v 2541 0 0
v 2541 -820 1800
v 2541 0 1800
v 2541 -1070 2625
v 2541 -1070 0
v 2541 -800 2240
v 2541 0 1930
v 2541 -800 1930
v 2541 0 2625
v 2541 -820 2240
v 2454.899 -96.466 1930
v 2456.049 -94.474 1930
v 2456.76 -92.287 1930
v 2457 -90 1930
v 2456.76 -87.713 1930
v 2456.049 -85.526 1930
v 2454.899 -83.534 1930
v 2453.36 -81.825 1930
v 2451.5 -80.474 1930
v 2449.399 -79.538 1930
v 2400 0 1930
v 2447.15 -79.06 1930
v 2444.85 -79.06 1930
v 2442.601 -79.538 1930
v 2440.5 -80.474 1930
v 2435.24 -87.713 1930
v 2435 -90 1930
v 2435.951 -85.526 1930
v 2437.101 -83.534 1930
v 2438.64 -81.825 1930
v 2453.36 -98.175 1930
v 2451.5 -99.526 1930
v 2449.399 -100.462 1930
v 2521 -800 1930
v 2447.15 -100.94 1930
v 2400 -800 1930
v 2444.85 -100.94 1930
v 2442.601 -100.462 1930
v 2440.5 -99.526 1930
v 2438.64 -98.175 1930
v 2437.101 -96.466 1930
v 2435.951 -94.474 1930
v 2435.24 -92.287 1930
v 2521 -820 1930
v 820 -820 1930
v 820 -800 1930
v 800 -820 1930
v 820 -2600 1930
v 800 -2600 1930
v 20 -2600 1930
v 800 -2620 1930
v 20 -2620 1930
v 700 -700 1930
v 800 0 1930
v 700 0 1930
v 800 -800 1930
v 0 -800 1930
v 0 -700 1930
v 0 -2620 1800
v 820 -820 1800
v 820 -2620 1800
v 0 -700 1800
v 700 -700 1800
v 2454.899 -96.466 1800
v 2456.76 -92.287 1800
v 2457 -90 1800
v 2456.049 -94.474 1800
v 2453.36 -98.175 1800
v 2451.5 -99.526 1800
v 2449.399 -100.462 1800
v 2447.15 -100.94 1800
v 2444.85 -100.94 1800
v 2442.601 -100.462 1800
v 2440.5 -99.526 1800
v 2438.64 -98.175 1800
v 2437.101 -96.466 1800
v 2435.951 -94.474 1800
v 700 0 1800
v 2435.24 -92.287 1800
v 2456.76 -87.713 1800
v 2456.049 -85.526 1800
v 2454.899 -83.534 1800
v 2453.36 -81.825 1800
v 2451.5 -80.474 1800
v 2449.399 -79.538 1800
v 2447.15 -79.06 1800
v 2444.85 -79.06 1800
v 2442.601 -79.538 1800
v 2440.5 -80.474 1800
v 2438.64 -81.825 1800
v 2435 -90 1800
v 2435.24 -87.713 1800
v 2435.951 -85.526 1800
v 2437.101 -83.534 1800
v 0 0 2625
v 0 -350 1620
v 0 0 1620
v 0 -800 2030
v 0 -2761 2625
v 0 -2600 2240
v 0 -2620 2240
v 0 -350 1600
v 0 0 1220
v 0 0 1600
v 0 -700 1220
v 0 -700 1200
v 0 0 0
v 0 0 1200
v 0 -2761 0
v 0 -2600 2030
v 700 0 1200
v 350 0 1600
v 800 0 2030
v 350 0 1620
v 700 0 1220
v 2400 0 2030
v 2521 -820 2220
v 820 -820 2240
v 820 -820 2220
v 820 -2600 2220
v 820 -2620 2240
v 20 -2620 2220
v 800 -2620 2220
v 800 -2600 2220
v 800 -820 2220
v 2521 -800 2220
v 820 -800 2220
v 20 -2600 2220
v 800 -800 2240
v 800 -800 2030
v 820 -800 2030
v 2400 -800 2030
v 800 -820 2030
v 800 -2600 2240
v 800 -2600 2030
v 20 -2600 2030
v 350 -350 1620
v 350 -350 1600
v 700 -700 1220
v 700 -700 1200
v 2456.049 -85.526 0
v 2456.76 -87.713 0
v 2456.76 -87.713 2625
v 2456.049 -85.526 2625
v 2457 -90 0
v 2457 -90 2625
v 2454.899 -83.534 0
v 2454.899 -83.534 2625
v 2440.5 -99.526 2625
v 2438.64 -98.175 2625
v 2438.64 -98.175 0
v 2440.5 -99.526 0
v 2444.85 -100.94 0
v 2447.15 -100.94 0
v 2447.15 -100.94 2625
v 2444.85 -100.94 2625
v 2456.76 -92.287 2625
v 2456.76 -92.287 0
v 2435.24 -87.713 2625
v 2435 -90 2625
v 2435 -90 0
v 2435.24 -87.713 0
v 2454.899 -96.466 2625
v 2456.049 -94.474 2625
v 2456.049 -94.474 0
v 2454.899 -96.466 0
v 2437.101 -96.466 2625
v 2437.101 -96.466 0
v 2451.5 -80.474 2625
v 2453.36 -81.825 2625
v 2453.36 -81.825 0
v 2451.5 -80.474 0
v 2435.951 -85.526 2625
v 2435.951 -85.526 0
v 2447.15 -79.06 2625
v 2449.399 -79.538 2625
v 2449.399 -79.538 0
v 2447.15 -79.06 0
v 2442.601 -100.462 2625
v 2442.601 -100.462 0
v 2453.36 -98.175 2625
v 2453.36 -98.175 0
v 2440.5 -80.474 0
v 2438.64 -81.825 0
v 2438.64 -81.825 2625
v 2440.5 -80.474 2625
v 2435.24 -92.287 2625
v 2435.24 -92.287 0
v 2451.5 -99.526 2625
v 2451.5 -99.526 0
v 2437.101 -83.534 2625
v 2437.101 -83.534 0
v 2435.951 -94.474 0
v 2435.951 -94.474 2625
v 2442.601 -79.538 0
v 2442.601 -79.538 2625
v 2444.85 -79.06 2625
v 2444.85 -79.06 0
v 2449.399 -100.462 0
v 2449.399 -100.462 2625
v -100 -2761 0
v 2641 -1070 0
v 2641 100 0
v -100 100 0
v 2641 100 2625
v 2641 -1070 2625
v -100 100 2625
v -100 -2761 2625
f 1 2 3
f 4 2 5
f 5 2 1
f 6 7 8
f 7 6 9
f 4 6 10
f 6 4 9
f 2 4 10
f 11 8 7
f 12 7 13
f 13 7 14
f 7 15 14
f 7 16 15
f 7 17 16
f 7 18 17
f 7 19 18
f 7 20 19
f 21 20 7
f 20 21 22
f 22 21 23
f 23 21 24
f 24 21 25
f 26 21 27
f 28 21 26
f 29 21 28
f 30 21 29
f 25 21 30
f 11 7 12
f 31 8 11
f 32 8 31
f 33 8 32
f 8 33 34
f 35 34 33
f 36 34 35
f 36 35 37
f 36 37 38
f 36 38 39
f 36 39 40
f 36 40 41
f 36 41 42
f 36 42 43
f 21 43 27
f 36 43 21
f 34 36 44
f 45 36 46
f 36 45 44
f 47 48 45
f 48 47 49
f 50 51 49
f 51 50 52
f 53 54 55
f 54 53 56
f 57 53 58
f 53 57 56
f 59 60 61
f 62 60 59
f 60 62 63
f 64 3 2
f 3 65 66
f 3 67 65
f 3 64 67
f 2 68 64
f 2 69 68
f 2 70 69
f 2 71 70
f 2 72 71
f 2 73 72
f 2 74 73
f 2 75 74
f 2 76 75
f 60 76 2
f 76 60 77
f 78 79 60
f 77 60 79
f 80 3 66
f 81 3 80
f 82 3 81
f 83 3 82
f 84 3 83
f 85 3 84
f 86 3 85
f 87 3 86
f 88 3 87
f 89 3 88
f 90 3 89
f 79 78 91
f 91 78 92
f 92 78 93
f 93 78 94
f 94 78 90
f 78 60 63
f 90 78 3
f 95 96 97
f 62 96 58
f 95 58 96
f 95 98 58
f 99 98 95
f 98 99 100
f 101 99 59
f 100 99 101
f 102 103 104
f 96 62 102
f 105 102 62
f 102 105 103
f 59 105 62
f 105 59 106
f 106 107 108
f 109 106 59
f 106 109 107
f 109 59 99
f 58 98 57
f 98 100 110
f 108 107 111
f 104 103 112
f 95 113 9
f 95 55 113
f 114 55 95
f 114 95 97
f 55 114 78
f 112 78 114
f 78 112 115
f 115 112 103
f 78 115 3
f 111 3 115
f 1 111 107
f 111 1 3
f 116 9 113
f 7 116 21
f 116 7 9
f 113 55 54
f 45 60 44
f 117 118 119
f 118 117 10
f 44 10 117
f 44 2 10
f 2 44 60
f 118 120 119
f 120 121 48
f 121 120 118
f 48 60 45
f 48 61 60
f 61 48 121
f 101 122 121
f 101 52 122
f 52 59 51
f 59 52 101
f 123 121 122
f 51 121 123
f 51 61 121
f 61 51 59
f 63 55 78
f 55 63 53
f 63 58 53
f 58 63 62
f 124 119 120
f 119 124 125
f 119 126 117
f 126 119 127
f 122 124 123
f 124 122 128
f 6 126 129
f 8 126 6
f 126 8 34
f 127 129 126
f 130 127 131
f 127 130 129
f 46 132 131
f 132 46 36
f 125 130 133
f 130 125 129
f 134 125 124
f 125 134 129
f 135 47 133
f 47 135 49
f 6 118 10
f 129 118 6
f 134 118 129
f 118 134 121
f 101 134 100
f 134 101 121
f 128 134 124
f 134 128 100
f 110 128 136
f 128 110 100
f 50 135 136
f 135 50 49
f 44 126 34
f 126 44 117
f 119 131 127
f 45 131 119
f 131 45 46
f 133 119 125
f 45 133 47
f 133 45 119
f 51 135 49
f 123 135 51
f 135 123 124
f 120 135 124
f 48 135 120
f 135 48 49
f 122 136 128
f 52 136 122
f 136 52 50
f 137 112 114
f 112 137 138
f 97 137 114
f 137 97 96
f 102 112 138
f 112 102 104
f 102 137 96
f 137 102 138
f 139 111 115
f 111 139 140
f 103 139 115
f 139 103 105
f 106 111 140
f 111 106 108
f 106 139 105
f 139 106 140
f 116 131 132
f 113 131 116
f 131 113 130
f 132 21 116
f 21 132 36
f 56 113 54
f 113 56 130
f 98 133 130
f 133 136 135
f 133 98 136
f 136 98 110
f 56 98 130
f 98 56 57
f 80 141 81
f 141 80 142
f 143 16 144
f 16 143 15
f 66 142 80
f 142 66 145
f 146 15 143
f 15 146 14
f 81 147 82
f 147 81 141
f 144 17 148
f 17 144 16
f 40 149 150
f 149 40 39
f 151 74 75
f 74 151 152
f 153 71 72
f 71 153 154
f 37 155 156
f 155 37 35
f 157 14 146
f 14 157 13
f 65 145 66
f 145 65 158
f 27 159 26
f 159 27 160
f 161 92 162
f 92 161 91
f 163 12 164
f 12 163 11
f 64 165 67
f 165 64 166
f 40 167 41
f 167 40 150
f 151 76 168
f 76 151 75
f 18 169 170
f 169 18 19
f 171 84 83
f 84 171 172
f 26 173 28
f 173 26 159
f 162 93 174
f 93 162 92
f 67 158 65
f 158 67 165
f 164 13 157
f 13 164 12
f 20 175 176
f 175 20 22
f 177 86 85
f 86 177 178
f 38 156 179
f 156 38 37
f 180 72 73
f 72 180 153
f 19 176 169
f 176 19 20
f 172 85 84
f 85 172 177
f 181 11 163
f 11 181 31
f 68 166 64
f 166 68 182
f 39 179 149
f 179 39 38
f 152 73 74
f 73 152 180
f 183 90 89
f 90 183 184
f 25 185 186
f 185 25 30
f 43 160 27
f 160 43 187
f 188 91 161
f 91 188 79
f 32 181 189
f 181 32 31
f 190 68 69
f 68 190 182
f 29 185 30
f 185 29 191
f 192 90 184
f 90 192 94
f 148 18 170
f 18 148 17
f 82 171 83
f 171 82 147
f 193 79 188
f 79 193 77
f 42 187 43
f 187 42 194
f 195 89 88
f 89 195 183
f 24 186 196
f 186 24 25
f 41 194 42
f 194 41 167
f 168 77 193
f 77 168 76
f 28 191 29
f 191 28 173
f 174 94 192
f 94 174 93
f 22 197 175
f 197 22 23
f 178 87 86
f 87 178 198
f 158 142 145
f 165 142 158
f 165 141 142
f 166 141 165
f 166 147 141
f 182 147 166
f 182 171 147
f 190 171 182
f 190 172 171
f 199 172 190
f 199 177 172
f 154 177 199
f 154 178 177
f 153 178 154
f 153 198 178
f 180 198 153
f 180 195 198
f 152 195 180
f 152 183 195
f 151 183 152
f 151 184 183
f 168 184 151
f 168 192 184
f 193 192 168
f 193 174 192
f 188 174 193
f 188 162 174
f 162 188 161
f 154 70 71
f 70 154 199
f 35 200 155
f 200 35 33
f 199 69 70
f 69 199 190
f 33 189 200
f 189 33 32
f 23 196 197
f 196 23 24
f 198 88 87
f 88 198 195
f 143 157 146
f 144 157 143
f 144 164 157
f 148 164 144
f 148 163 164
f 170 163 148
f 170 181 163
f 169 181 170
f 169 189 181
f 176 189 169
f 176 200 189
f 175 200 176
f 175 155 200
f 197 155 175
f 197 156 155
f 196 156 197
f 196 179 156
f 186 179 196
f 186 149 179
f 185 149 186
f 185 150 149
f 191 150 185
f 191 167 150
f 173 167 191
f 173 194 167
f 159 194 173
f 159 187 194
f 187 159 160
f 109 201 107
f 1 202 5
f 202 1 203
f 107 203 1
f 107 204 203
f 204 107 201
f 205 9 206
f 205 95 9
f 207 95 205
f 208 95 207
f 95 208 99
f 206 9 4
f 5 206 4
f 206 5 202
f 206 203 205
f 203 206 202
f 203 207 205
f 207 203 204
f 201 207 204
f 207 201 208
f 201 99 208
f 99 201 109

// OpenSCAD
// file: hulls.scad
module hullPairs(pos,close=true){
    for(i=[0:len(pos)-2]){
        hull() {
            translate(pos[i+0]) children();
            translate(pos[i+1]) children();
        }
    }
    if(close)
    hull() {
        translate(pos[0]) children();
        translate(pos[len(pos)-1]) children();
    }
    
}

module hullLine() {
    for(o = [0:$children-2])  {
        hull() {
            children(o+0);
            children(o+1);
        }
    }
}
// main file
use <hulls.scad>


HEIGHT=2625;

WALL_BACK=2541;
WALL_LEFT=2761;
WALL_RIGHT=1070;
WALL_WIDTH=100;




// B=BARRIER
B_WIDTH=20;
B_HEIGHT=300;

MAT1=[800,1600,100];
MAT2=[800,1800,100];

// S=STRUCTURE
S_HOLE=[700,700];
S_GAP=[800,800];
S_THICK=130;
S_HEIGHT=1800;  //  SAFE_H 177
S_HEIGHT2=S_HEIGHT+S_THICK;
S_BACK_WIDTH=MAT1[0]+B_WIDTH;
S_LEFT_WIDTH=MAT2[0]+B_WIDTH;
S_LEFT_LEN=MAT2[1]+B_WIDTH+S_GAP[1];


CLEARANCE=HEIGHT-S_THICK-S_HEIGHT-MAT1[2];
echo("@clearance",CLEARANCE);

module walls() {

    color([1,0,0])
    translate([WALL_BACK-95,-90,0])
        cylinder(d=22,h=HEIGHT);

    color([0,0,1,.3])
    linear_extrude(HEIGHT)
    polygon(
    [
        [0,0],
        [0,-WALL_LEFT],
        [-WALL_WIDTH,-WALL_LEFT],
        [-WALL_WIDTH,WALL_WIDTH],
        [WALL_BACK+WALL_WIDTH,WALL_WIDTH],
        [WALL_BACK+WALL_WIDTH,-WALL_RIGHT],
        [WALL_BACK,-WALL_RIGHT],
        [WALL_BACK,0],
        ]
    );
    
}


module main() {
    translate([0,0,S_HEIGHT])
    difference() {
        union() {
            translate([0,-S_BACK_WIDTH,0])
            cube([WALL_BACK,S_BACK_WIDTH,S_THICK]);
            translate([0,-S_LEFT_LEN,0])
            cube([S_LEFT_WIDTH,S_LEFT_LEN,S_THICK]);
        }
//        translate([S_HOLE[0],-S_HOLE[1],0]/2)
        cube([S_HOLE[0],S_HOLE[1],S_HEIGHT]*2,center=true);
    }
}

module barrier() {
    Q=B_WIDTH/2;
    points=[
        [WALL_BACK-Q,-(S_BACK_WIDTH-Q)],
        [S_LEFT_WIDTH-Q,-(S_BACK_WIDTH-Q)],
        [S_LEFT_WIDTH-Q,-(S_LEFT_LEN-Q)],
        [Q,-(S_LEFT_LEN-Q)],
    ];
    
    translate([0,0,S_HEIGHT+S_THICK+B_HEIGHT]){
        hullPairs(points,false)
            cube(B_WIDTH,center=true);
        for(p= points) {
            translate(p)
            translate([0,0,-B_HEIGHT/2])
            cube([B_WIDTH,B_WIDTH,B_HEIGHT],center=true);
        }
    }
}

module mat() {
//    translate();
//    cube(MAT1);

    translate([S_GAP[0],0,S_HEIGHT2])
    rotate(-90)
    color([0,1,0,.5])
    cube(MAT1);


    translate([0,-S_LEFT_LEN+B_WIDTH,S_HEIGHT2])
    color([0,1,0,.5])
    cube(MAT2);
}

module steps() {
    STEP_THICK=20;
    STEP_H=S_HEIGHT-600;
    SEAT_H=S_HEIGHT-200;

    echo("@stepH",STEP_H);

    translate([0,0,SEAT_H]) {
        cube([S_HOLE[0]/2,S_HOLE[1]/2,STEP_THICK]);
    }

    translate([0,0,STEP_H]) {
        cube([S_HOLE[0],S_HOLE[1],STEP_THICK]);
    }
}

module all(walls=true) {
main();
barrier();
mirror([0,1,0])
steps();
mat();
    if(walls)
walls();


}

mode="x";
if(mode=="proj") {
projection(cut = true) 
translate([0,0,-S_HEIGHT-10])
all(false);
}else {
    all()
    ;
}
